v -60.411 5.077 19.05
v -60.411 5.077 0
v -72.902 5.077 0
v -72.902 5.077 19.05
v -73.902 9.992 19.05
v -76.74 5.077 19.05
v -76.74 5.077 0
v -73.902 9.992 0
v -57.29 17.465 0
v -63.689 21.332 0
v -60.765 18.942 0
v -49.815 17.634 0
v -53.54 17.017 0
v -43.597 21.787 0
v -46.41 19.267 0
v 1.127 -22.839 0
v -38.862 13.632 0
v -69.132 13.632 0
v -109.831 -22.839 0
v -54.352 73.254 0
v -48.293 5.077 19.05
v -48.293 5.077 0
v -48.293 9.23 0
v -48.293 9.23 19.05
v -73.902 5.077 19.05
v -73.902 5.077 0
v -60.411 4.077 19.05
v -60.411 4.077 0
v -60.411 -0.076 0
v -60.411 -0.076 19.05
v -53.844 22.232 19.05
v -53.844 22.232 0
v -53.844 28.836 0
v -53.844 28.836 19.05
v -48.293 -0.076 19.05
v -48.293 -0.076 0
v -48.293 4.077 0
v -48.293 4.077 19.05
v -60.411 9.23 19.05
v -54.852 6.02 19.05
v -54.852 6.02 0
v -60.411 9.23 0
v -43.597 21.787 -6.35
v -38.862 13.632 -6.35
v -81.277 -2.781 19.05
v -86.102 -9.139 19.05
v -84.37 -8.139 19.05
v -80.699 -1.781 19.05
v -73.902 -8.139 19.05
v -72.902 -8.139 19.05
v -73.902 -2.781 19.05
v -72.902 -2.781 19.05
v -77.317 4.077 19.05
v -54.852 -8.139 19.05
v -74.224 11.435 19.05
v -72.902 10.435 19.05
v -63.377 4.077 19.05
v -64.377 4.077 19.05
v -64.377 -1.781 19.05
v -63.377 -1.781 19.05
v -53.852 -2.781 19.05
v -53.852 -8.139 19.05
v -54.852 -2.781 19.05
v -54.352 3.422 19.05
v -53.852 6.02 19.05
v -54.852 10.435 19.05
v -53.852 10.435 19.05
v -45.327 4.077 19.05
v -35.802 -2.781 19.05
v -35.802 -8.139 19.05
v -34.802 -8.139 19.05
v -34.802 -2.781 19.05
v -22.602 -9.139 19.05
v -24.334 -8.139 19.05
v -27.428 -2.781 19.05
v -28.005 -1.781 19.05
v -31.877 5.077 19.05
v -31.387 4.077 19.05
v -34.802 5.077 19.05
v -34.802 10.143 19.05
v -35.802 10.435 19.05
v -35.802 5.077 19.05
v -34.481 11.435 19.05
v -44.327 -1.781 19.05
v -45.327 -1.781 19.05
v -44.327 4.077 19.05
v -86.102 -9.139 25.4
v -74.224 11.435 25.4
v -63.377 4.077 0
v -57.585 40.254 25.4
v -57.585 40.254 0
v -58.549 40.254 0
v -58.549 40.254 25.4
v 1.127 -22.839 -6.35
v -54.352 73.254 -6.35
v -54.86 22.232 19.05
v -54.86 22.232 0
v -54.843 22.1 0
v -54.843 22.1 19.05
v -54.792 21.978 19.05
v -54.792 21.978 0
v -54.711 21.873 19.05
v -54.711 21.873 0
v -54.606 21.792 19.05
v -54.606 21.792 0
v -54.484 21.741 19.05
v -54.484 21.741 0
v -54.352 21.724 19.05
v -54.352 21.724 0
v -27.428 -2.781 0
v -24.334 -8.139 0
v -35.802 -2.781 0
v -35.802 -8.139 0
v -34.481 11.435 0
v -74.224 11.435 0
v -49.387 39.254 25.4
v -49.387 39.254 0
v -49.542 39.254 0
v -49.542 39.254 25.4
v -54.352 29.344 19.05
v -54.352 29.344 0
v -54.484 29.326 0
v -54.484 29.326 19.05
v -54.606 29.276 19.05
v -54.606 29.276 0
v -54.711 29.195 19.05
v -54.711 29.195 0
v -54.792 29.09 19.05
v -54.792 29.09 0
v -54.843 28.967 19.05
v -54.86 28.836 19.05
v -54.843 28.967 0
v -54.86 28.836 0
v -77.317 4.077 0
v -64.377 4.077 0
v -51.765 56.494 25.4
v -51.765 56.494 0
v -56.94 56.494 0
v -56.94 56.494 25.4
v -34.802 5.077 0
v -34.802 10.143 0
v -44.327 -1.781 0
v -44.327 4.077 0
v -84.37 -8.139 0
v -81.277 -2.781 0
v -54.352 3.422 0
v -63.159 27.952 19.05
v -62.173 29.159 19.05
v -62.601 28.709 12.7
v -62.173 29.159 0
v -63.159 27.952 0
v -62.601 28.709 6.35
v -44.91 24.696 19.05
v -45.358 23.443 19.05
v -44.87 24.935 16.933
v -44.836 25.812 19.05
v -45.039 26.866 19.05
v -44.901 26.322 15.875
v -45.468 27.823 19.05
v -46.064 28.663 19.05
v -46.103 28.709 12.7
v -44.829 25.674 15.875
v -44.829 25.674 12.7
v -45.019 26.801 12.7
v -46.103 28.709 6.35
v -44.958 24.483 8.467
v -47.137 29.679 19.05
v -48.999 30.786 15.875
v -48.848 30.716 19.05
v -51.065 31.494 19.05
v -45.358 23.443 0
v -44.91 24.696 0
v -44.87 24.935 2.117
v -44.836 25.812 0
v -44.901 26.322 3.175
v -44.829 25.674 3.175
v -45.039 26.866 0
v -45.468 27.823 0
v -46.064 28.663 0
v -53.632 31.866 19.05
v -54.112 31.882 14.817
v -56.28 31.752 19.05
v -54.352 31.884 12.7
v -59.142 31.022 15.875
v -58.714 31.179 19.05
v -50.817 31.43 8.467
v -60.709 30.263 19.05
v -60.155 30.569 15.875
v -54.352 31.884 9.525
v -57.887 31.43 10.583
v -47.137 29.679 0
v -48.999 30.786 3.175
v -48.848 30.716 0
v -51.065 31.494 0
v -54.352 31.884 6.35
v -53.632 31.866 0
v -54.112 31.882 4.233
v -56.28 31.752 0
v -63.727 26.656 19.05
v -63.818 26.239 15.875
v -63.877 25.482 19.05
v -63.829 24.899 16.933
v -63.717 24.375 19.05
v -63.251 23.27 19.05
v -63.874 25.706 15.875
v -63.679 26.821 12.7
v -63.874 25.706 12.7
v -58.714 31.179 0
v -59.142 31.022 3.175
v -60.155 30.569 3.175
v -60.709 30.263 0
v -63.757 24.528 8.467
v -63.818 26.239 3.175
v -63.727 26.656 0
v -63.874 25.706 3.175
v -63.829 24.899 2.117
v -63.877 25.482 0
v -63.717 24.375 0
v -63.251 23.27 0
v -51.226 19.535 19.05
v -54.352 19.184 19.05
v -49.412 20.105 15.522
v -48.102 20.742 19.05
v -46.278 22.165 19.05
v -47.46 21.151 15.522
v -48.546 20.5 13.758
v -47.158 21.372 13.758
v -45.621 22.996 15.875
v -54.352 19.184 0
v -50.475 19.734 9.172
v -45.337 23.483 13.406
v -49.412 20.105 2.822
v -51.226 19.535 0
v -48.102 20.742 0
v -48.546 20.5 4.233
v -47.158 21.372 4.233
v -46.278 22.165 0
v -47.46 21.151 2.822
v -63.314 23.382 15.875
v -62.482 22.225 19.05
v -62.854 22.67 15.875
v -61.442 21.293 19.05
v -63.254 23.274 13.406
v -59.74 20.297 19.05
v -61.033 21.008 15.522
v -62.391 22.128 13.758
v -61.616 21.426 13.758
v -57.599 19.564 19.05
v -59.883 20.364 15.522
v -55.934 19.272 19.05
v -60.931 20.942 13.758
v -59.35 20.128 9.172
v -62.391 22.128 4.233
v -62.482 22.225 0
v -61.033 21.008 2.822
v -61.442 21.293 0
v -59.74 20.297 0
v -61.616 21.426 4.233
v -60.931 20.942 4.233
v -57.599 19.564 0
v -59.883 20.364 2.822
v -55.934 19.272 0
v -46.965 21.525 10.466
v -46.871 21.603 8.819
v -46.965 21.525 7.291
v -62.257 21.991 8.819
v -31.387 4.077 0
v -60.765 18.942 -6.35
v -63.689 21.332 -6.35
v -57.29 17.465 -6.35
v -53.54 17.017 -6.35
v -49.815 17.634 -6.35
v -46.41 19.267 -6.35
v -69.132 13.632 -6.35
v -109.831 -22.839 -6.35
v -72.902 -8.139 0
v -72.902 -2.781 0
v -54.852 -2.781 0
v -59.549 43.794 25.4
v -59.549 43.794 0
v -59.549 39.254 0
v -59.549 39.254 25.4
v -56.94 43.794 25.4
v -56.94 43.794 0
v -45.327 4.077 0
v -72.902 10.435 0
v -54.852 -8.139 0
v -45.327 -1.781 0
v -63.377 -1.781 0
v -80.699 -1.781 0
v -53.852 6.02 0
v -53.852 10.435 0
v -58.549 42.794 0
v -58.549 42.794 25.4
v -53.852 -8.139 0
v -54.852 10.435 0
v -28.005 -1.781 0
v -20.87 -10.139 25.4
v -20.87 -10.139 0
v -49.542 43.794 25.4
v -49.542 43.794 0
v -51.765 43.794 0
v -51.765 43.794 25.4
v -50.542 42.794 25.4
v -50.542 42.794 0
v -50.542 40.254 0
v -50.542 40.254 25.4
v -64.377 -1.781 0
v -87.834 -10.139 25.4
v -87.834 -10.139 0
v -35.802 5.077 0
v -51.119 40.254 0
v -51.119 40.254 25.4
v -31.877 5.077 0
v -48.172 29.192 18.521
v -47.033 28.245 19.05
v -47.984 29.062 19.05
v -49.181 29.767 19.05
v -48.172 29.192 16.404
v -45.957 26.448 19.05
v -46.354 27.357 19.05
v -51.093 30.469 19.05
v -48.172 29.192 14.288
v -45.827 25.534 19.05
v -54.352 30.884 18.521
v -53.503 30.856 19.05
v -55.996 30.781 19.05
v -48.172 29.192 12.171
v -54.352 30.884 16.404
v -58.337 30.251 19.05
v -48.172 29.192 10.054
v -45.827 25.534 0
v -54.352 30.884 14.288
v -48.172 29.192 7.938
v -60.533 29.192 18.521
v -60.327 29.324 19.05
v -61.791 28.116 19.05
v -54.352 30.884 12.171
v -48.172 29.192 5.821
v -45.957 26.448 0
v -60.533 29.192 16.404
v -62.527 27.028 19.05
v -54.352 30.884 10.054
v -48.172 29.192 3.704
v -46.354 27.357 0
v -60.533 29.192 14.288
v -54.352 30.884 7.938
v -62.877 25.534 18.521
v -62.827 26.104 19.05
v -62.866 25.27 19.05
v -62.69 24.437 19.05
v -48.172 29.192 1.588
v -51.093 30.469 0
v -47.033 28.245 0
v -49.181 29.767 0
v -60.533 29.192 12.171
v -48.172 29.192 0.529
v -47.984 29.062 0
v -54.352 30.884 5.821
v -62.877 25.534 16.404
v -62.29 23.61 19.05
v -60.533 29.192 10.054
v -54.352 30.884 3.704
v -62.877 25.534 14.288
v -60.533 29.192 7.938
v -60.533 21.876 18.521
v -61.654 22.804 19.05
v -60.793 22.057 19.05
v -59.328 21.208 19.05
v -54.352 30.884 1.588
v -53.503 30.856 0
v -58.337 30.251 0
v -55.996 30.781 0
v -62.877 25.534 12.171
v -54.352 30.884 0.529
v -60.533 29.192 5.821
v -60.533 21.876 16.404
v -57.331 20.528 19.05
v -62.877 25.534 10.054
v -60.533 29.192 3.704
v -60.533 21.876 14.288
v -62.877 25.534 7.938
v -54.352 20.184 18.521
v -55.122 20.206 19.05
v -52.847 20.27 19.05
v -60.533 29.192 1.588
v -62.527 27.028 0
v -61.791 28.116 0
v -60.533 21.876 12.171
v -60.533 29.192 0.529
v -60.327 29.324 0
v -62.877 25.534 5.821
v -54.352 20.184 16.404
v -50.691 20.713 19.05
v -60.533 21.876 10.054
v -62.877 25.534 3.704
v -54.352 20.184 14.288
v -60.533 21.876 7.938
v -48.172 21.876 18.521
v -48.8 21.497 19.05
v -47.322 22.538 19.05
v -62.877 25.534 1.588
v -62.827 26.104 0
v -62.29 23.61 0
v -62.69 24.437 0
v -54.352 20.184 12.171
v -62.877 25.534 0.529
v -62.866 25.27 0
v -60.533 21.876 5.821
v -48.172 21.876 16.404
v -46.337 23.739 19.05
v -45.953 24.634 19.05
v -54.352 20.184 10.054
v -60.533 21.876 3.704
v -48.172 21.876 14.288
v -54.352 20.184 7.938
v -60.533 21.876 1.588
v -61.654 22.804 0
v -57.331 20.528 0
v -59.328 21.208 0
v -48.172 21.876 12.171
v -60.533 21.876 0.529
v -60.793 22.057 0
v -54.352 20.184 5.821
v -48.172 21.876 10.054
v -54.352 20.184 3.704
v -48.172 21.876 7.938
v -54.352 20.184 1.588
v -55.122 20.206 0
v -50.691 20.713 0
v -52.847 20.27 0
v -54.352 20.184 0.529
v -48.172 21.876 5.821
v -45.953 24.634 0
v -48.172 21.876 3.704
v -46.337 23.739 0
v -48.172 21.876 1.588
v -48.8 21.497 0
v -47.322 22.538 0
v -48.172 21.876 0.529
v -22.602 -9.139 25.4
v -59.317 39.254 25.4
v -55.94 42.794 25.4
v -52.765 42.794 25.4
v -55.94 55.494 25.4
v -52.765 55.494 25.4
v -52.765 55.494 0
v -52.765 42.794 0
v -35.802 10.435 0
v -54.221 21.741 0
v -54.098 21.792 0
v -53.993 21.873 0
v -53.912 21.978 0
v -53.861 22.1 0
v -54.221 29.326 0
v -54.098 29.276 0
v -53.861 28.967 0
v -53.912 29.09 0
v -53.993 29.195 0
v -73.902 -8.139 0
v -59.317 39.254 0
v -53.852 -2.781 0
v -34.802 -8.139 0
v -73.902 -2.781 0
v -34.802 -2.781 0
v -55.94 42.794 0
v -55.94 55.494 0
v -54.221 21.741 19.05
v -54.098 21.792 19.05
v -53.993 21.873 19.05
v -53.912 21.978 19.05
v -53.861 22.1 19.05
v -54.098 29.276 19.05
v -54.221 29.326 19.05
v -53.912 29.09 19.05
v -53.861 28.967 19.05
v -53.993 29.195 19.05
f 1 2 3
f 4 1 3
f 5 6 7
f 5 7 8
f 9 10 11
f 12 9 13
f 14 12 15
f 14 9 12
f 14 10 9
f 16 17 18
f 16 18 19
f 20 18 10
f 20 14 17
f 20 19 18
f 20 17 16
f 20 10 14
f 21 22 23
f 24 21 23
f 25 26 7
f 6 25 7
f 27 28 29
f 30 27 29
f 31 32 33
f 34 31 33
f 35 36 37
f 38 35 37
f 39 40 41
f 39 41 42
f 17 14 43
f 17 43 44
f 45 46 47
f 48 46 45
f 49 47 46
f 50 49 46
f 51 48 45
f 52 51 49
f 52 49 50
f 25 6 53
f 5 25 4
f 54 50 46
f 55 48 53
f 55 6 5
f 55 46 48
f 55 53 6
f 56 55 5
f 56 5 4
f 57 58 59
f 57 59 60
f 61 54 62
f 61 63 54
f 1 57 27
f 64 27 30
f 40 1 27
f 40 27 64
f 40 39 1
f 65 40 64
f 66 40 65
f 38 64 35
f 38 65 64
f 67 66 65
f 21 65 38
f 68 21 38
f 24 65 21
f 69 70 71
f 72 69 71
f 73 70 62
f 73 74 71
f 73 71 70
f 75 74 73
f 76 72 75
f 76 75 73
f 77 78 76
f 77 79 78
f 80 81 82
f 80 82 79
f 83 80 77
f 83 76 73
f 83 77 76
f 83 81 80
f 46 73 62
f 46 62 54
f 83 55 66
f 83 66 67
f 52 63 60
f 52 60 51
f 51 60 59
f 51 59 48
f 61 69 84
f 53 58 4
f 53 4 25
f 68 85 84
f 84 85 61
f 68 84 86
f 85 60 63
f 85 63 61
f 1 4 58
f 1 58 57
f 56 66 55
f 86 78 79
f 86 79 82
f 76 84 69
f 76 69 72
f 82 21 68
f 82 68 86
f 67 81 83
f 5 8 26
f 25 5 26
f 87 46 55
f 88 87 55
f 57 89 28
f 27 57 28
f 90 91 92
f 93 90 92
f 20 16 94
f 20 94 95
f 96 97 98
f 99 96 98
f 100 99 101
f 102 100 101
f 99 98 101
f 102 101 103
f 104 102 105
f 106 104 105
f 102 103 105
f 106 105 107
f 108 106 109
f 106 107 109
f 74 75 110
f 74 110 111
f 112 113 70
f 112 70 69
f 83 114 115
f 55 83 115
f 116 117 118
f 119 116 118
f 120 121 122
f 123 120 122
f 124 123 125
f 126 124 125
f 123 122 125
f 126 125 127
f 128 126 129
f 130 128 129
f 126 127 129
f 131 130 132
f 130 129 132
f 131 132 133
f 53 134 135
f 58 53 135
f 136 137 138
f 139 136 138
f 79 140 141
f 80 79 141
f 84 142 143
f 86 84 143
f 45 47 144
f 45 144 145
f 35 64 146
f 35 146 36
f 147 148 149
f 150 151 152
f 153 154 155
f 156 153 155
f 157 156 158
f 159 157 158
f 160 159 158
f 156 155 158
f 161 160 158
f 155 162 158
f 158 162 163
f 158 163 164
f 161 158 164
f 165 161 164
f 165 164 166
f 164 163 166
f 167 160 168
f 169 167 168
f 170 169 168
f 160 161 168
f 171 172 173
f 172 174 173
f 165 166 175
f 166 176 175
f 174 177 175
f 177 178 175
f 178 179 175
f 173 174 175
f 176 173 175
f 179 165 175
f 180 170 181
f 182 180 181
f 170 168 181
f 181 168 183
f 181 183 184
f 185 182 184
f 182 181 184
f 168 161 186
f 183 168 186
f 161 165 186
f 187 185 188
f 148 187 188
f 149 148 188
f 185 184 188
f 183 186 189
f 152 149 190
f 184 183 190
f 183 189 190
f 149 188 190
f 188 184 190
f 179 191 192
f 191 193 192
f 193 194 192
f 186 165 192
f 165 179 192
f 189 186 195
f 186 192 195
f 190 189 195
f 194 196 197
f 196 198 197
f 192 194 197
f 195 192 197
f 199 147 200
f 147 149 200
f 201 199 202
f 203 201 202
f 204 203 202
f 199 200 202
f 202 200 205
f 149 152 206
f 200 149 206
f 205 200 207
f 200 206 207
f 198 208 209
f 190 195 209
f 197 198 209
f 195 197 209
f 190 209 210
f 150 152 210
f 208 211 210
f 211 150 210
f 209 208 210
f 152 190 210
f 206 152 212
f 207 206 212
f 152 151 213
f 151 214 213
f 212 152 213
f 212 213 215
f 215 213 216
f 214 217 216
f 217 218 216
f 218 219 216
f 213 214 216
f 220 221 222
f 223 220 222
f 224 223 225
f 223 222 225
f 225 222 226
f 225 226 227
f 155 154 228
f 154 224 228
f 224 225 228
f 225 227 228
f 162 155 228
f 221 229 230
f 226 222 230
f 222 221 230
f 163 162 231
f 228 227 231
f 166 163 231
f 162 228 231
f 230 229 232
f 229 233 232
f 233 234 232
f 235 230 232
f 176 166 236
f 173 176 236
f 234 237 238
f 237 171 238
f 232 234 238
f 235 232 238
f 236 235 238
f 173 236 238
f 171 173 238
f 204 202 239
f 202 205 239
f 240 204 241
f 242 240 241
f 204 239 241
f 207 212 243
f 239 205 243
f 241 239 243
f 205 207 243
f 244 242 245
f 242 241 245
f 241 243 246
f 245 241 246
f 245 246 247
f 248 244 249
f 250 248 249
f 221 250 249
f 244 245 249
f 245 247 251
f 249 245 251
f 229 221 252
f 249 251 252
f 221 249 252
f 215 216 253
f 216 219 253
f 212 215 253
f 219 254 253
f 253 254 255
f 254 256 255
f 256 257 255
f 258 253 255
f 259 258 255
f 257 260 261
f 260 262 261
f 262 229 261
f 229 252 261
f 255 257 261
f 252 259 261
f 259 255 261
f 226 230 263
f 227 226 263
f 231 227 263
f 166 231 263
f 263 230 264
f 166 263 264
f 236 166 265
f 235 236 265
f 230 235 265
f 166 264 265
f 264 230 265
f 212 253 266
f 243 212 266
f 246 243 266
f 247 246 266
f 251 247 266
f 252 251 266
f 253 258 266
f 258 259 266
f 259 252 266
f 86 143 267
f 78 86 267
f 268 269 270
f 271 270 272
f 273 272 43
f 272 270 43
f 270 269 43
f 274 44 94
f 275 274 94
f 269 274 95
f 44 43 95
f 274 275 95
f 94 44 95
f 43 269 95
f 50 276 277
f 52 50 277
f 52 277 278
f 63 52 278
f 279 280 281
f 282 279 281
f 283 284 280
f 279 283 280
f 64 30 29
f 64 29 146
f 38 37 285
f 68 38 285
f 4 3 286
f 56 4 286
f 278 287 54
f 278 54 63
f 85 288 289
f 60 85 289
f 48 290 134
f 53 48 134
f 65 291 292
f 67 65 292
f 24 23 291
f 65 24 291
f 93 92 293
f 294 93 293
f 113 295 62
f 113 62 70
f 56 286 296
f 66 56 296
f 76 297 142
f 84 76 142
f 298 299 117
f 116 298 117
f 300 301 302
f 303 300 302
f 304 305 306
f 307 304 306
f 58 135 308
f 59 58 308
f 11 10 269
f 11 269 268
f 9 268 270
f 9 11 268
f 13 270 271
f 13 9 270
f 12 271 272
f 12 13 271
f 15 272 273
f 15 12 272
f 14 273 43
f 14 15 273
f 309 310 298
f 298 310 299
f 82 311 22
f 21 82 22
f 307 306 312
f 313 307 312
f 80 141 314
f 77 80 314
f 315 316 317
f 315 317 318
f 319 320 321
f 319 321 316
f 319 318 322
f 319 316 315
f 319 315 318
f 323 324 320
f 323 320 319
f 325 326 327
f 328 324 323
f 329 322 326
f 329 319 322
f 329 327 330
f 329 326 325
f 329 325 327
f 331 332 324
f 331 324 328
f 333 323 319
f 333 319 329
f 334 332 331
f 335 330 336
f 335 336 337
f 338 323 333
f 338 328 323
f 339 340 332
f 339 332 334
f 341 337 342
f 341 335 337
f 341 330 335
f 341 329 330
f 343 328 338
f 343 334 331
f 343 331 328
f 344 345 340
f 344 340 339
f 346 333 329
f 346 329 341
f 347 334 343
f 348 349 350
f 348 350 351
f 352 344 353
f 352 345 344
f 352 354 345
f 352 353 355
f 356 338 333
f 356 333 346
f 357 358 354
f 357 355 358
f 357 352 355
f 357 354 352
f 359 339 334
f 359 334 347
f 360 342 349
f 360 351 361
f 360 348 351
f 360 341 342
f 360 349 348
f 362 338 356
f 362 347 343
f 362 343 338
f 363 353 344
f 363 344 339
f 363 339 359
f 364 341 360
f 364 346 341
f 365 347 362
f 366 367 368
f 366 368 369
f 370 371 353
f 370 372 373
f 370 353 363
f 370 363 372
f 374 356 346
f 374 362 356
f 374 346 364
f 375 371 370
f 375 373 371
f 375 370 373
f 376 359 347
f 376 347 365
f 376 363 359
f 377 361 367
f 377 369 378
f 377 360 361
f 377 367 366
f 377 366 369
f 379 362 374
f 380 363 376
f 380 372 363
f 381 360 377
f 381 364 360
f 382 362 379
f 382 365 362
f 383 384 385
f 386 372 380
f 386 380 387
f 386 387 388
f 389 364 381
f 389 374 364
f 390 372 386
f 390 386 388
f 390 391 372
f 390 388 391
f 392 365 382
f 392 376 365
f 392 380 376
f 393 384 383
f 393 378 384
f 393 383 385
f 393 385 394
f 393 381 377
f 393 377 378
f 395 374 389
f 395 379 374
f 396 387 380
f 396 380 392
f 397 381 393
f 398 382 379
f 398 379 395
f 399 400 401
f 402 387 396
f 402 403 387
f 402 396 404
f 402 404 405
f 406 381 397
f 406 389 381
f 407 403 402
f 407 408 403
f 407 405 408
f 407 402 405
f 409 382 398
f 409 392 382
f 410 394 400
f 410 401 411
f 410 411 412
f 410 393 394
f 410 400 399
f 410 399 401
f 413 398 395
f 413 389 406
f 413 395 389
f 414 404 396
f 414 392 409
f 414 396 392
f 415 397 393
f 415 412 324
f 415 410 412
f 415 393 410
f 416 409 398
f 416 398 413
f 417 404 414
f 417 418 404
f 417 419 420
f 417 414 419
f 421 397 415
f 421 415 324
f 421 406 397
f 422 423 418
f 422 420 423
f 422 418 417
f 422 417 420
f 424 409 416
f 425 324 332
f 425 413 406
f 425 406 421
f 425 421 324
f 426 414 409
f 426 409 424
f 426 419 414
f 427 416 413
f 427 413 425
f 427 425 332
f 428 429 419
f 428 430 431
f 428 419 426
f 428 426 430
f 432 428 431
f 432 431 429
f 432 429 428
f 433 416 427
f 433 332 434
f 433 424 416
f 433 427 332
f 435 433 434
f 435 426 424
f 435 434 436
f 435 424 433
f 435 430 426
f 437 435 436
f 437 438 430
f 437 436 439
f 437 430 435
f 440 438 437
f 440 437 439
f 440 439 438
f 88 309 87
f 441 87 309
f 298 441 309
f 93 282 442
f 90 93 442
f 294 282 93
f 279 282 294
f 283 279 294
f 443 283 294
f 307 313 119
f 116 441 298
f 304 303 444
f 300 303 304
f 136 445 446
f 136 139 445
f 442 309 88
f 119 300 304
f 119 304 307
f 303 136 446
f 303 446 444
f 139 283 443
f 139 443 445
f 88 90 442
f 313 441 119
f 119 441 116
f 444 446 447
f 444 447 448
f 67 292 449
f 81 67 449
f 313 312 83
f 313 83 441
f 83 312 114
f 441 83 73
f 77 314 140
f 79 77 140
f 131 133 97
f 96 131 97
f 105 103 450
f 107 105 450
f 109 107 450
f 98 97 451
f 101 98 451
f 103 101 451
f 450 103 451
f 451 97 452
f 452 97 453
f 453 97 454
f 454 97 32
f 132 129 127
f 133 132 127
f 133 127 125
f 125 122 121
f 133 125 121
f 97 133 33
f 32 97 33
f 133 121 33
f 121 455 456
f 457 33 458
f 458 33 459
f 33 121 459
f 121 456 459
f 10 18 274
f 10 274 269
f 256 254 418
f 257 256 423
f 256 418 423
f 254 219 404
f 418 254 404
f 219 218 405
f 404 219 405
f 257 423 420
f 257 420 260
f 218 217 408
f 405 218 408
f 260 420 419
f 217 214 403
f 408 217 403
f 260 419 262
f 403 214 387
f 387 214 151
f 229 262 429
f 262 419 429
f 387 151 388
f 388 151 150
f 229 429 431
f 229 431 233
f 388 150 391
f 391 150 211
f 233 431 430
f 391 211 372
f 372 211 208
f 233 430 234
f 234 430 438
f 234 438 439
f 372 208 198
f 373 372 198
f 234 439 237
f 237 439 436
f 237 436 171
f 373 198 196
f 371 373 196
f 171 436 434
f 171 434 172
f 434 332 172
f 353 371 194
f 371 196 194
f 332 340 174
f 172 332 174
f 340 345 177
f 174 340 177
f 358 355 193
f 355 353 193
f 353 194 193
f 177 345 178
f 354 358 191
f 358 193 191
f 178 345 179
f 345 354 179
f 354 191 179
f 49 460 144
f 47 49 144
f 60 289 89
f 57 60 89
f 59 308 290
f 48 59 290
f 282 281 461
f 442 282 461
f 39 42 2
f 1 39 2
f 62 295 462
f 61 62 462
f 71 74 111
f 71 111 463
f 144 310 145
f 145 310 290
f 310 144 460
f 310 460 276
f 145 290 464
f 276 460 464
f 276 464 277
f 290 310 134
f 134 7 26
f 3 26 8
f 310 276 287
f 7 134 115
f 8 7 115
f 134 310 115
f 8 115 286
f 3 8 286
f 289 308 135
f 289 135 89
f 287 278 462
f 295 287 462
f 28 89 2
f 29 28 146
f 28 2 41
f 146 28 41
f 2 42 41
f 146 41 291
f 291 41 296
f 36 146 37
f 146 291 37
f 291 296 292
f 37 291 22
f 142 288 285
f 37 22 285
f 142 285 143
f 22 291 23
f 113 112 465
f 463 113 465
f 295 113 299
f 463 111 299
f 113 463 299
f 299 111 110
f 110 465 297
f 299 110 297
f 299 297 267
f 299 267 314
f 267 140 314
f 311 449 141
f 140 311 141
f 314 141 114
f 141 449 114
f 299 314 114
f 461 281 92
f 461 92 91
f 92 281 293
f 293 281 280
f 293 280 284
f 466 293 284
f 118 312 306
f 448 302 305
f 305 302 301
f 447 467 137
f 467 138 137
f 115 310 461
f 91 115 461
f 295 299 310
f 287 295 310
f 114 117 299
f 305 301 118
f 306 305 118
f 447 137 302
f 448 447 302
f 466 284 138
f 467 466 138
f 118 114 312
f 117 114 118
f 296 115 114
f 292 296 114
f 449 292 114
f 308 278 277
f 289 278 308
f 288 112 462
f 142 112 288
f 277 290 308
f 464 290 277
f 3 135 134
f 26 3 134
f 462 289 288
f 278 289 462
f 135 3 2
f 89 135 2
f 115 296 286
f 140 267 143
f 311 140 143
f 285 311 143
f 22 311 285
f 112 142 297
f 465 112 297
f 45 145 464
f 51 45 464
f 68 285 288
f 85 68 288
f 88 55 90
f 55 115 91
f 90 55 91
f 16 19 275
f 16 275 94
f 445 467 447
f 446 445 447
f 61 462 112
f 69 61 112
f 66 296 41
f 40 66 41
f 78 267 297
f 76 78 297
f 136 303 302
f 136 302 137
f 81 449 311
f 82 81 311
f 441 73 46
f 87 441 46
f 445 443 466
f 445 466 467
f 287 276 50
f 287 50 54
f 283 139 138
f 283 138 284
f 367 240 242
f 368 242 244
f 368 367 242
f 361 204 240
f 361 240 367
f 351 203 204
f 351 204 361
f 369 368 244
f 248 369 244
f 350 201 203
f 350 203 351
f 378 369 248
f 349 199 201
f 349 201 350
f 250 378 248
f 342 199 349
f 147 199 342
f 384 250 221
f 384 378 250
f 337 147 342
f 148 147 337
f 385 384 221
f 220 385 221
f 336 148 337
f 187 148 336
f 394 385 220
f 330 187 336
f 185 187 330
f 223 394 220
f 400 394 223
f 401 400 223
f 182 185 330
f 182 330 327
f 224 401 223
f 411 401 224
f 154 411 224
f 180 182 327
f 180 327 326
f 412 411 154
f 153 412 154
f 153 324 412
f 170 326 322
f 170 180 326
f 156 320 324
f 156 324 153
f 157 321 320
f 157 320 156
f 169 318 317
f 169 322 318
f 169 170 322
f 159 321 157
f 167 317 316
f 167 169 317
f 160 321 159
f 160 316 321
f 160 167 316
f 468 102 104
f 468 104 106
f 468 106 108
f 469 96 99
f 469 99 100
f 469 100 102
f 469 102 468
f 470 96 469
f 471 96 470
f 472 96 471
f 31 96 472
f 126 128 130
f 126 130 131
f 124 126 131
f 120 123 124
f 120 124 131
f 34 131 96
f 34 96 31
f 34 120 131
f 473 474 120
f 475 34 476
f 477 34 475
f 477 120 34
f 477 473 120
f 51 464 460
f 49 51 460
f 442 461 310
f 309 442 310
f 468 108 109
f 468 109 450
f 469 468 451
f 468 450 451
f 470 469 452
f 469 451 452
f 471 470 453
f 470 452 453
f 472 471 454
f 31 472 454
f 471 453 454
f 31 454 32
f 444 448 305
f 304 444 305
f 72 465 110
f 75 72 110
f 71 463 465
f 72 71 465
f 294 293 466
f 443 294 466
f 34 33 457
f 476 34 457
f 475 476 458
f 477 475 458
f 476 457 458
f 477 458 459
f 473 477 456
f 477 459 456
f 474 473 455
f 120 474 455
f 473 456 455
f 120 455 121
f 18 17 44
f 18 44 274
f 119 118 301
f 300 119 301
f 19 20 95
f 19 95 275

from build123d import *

# Parameters (mm, degrees)
F0_W     = 18.05
F0_H     = 5.358
F1_DEPTH = 19.05
F2_DEPTH = 25.4
F4_DEPTH = 6.35


# Not quite as in the source:
# - the dataset's text gives a spline's control points without its knots; the knots are read off the source's solid


with BuildPart() as f1:
    # F0 (on Top) → F1 (new body)
    with BuildSketch(Plane.XY):
        Polygon((-73.402151112, 4.5771139196), (-78.1832148198, 4.5771139196), (-82.1426829659, -2.2808860804), (-73.402151112, -2.2808860804), (-63.877151112, -2.2808860804), (-63.877151112, 4.5771139196), align=None)
        Polygon((-64.377151112, -1.7808860804), (-80.6993072929, -1.7808860804), (-77.317189416, 4.0771139196), (-64.377151112, 4.0771139196), align=None, mode=Mode.SUBTRACT)
        Polygon((-73.402151112, -2.2808860804), (-82.1426829659, -2.2808860804), (-86.102151112, -9.1388860804), (-73.402151112, -9.1388860804), align=None)
        Polygon((-84.3701003044, -8.1388860804), (-81.2766575621, -2.7808860804), (-73.902151112, -2.7808860804), (-73.902151112, -8.1388860804), align=None, mode=Mode.SUBTRACT)
        Polygon((-63.877151112, -2.2808860804), (-73.402151112, -2.2808860804), (-73.402151112, -9.1388860804), (-54.352151112, -9.1388860804), (-54.352151112, -2.2808860804), align=None)
        with Locations((-63.877151112, -5.4598860804)):
            Rectangle(F0_W, F0_H, mode=Mode.SUBTRACT)
        Polygon((-35.302151112, 11.4351139196), (-73.402151112, 11.4351139196), (-73.402151112, 4.5771139196), (-63.877151112, 4.5771139196), (-63.877151112, -2.2808860804), (-54.352151112, -2.2808860804), (-44.827151112, -2.2808860804), (-44.827151112, 4.5771139196), (-35.302151112, 4.5771139196), align=None)
        Polygon((-48.2928307031, -0.0759368879), (-48.2928307031, 4.0771139196), (-45.327151112, 4.0771139196), (-45.327151112, -1.7808860804), (-63.377151112, -1.7808860804), (-63.377151112, 4.0771139196), (-60.4114715209, 4.0771139196), (-60.4114715209, -0.0759368879), (-54.352151112, 3.4224133812), align=None, mode=Mode.SUBTRACT)
        Polygon((-60.4114715209, 9.2301647272), (-60.4114715209, 5.0771139196), (-72.902151112, 5.0771139196), (-72.902151112, 10.4351139196), (-54.852151112, 10.4351139196), (-54.852151112, 6.0204895926), align=None, mode=Mode.SUBTRACT)
        Polygon((-35.802151112, 5.0771139196), (-48.2928307031, 5.0771139196), (-48.2928307031, 9.2301647272), (-53.852151112, 6.0204895926), (-53.852151112, 10.4351139196), (-35.802151112, 10.4351139196), align=None, mode=Mode.SUBTRACT)
        Polygon((-73.402151112, 11.4351139196), (-74.2237466737, 11.4351139196), (-78.1832148198, 4.5771139196), (-73.402151112, 4.5771139196), align=None)
        Polygon((-73.902151112, 5.0771139196), (-76.7398391468, 5.0771139196), (-73.902151112, 9.992133772), align=None, mode=Mode.SUBTRACT)
        Polygon((-34.4805555503, 11.4351139196), (-35.302151112, 11.4351139196), (-35.302151112, 4.5771139196), (-30.5210874042, 4.5771139196), align=None)
        Polygon((-34.802151112, 10.1431388709), (-31.8772802426, 5.0771139196), (-34.802151112, 5.0771139196), align=None, mode=Mode.SUBTRACT)
        Polygon((-30.5210874042, 4.5771139196), (-35.302151112, 4.5771139196), (-44.827151112, 4.5771139196), (-44.827151112, -2.2808860804), (-35.302151112, -2.2808860804), (-26.5616192581, -2.2808860804), align=None)
        Polygon((-31.387112808, 4.0771139196), (-28.0049949311, -1.7808860804), (-44.327151112, -1.7808860804), (-44.327151112, 4.0771139196), align=None, mode=Mode.SUBTRACT)
        Polygon((-22.602151112, -9.1388860804), (-26.5616192581, -2.2808860804), (-35.302151112, -2.2808860804), (-35.302151112, -9.1388860804), align=None)
        Polygon((-34.802151112, -2.7808860804), (-27.4276446619, -2.7808860804), (-24.3342019195, -8.1388860804), (-34.802151112, -8.1388860804), align=None, mode=Mode.SUBTRACT)
        Polygon((-54.352151112, -2.2808860804), (-54.352151112, -9.1388860804), (-35.302151112, -9.1388860804), (-35.302151112, -2.2808860804), (-44.827151112, -2.2808860804), align=None)
        with Locations((-44.827151112, -5.4598860804)):
            Rectangle(F0_W, F0_H, mode=Mode.SUBTRACT)
    extrude(amount=F1_DEPTH)

    # F0 (on Top) → F2 (join)
    with BuildSketch(Plane.XY):
        Polygon((-56.939651112, 43.7939179328), (-59.5488287793, 43.7939179328), (-59.5488287793, 39.2539179328), (-59.3172532265, 39.2539179328), (-87.8342019195, -10.1388860804), (-20.8701003044, -10.1388860804), (-49.3870489975, 39.2539179328), (-49.542151112, 39.2539179328), (-49.542151112, 43.7939179328), (-51.764651112, 43.7939179328), (-51.764651112, 56.4939179328), (-56.939651112, 56.4939179328), align=None)
        Polygon((-74.2237466737, 11.4351139196), (-57.5852024189, 40.2539179328), (-58.5488287793, 40.2539179328), (-58.5488287793, 42.7939179328), (-55.939651112, 42.7939179328), (-55.939651112, 55.4939179328), (-52.764651112, 55.4939179328), (-52.764651112, 42.7939179328), (-50.542151112, 42.7939179328), (-50.542151112, 40.2539179328), (-51.119099805, 40.2539179328), (-34.4805555503, 11.4351139196), (-30.5210874042, 4.5771139196), (-26.5616192581, -2.2808860804), (-22.602151112, -9.1388860804), (-35.302151112, -9.1388860804), (-54.352151112, -9.1388860804), (-73.402151112, -9.1388860804), (-86.102151112, -9.1388860804), (-82.1426829659, -2.2808860804), (-78.1832148198, 4.5771139196), align=None, mode=Mode.SUBTRACT)
    extrude(amount=F2_DEPTH)


with BuildPart() as f1b:
    # F0 (on Top) → F1, piece 2 (new body)
    with BuildSketch(Plane.XY):
        with BuildLine():
            add(Edge.make_bspline(
                [(-54.352145642, 19.1837270599), (-37.8543616999, 19.1837270599), (-46.103253671, 28.7087270599), (-54.352145642, 38.2337270599), (-62.6010376131, 28.7087270599), (-70.8499295841, 19.1837270599), (-54.352145642, 19.1837270599)],
                knots=[4.7123889804, 4.7123889804, 4.7123889804, 6.8067840828, 6.8067840828, 8.9011791852, 8.9011791852, 10.9955742876, 10.9955742876, 10.9955742876], degree=2, weights=[1, 0.5, 1, 0.5, 1, 0.5, 1]))
        make_face()
        with BuildLine():
            add(Edge.make_bspline(
                [(-45.827145642, 25.5337270599), (-45.827145642, 25.8519377152), (-45.9208714076, 26.4883590256), (-46.3482817791, 27.4376066909), (-47.0906705746, 28.3694216685), (-48.1278583866, 29.2134440557), (-49.4278608435, 29.9276027455), (-50.9536840842, 30.4720106822), (-52.334286038, 30.7509003907), (-53.4791973585, 30.8645462988), (-54.352145642, 30.8933174405), (-55.2250939256, 30.8645462988), (-56.3700052461, 30.7509003907), (-57.7506071999, 30.4720106822), (-59.2764304406, 29.9276027455), (-60.5764328975, 29.2134440557), (-61.6136207095, 28.3694216685), (-62.3560095049, 27.4376066909), (-62.7834198764, 26.4883590256), (-62.9240085248, 25.5337270599), (-62.7834198764, 24.5790950943), (-62.3560095049, 23.6298474289), (-61.6136207095, 22.6980324514), (-60.5764328975, 21.8540100641), (-59.2764304406, 21.1398513743), (-57.7506071999, 20.5954434377), (-56.3700052461, 20.3165537291), (-55.2250939256, 20.2029078211), (-54.352145642, 20.1741366794), (-53.4791973585, 20.2029078211), (-52.334286038, 20.3165537291), (-50.9536840842, 20.5954434377), (-49.4278608435, 21.1398513743), (-48.1278583866, 21.8540100641), (-47.0906705746, 22.6980324514), (-46.3482817791, 23.6298474289), (-45.9208714076, 24.5790950943), (-45.827145642, 25.2155164047), (-45.827145642, 25.5337270599)],
                knots=[0, 0, 0, 0, 0.03125, 0.0625, 0.09375, 0.125, 0.15625, 0.1875, 0.21875, 0.234375, 0.25, 0.265625, 0.28125, 0.3125, 0.34375, 0.375, 0.40625, 0.4375, 0.46875, 0.5, 0.53125, 0.5625, 0.59375, 0.625, 0.65625, 0.6875, 0.71875, 0.734375, 0.75, 0.765625, 0.78125, 0.8125, 0.84375, 0.875, 0.90625, 0.9375, 0.96875, 1, 1, 1, 1], degree=3))
        make_face(mode=Mode.SUBTRACT)
    extrude(amount=F1_DEPTH)


with BuildPart() as f1c:
    # F0 (on Top) → F1, piece 3 (new body)
    with BuildSketch(Plane.XY):
        with BuildLine():
            ThreePointArc((-54.352145642, 29.3437270599), (-54.7113558869, 29.1949373048), (-54.860145642, 28.8357270599))
            Line((-54.860145642, 28.8357270599), (-54.860145642, 22.2317270599))
            ThreePointArc((-54.860145642, 22.2317270599), (-54.7113558869, 21.8725168151), (-54.352145642, 21.7237270599))
            ThreePointArc((-54.352145642, 21.7237270599), (-53.9929353972, 21.8725168151), (-53.844145642, 22.2317270599))
            Line((-53.844145642, 22.2317270599), (-53.844145642, 28.8357270599))
            ThreePointArc((-53.844145642, 28.8357270599), (-53.9929353972, 29.1949373048), (-54.352145642, 29.3437270599))
        make_face()
    extrude(amount=F1_DEPTH)


with BuildPart() as f4:
    # F3 (on face) → F4 (new body)
    with BuildSketch(Plane.XY):
        Polygon((-109.8312471757, -22.8388860804), (1.1269449517, -22.8388860804), (-54.352151112, 73.2537270599), align=None)
        Polygon((-59.5488287793, 43.7939179328), (-56.939651112, 43.7939179328), (-56.939651112, 56.4939179328), (-51.764651112, 56.4939179328), (-51.764651112, 43.7939179328), (-49.542151112, 43.7939179328), (-49.542151112, 39.2539179328), (-49.3870489975, 39.2539179328), (-20.8701003044, -10.1388860804), (-87.8342019195, -10.1388860804), (-59.3172532265, 39.2539179328), (-59.5488287793, 39.2539179328), align=None, mode=Mode.SUBTRACT)
        Polygon((-56.939651112, 56.4939179328), (-56.939651112, 43.7939179328), (-59.5488287793, 43.7939179328), (-59.5488287793, 39.2539179328), (-59.3172532265, 39.2539179328), (-87.8342019195, -10.1388860804), (-20.8701003044, -10.1388860804), (-49.3870489975, 39.2539179328), (-49.542151112, 39.2539179328), (-49.542151112, 43.7939179328), (-51.764651112, 43.7939179328), (-51.764651112, 56.4939179328), align=None)
        Polygon((-78.1832148198, 4.5771139196), (-74.2237466737, 11.4351139196), (-57.5852024189, 40.2539179328), (-58.5488287793, 40.2539179328), (-58.5488287793, 42.7939179328), (-55.939651112, 42.7939179328), (-55.939651112, 55.4939179328), (-52.764651112, 55.4939179328), (-52.764651112, 42.7939179328), (-50.542151112, 42.7939179328), (-50.542151112, 40.2539179328), (-51.119099805, 40.2539179328), (-34.4805555503, 11.4351139196), (-30.5210874042, 4.5771139196), (-26.5616192581, -2.2808860804), (-22.602151112, -9.1388860804), (-35.302151112, -9.1388860804), (-54.352151112, -9.1388860804), (-73.402151112, -9.1388860804), (-86.102151112, -9.1388860804), (-82.1426829659, -2.2808860804), align=None, mode=Mode.SUBTRACT)
        Polygon((-57.5852024189, 40.2539179328), (-74.2237466737, 11.4351139196), (-78.1832148198, 4.5771139196), (-82.1426829659, -2.2808860804), (-86.102151112, -9.1388860804), (-73.402151112, -9.1388860804), (-54.352151112, -9.1388860804), (-35.302151112, -9.1388860804), (-22.602151112, -9.1388860804), (-26.5616192581, -2.2808860804), (-30.5210874042, 4.5771139196), (-34.4805555503, 11.4351139196), (-51.119099805, 40.2539179328), (-50.542151112, 40.2539179328), (-50.542151112, 42.7939179328), (-52.764651112, 42.7939179328), (-52.764651112, 55.4939179328), (-55.939651112, 55.4939179328), (-55.939651112, 42.7939179328), (-58.5488287793, 42.7939179328), (-58.5488287793, 40.2539179328), align=None)
        with BuildLine():
            ThreePointArc((-63.6885240674, 21.3321540505), (-53.5401728786, 17.0166304748), (-43.5974113792, 21.7867740102))
            Line((-43.5974113792, 21.7867740102), (-38.8624295592, 13.6320823804))
            Line((-38.8624295592, 13.6320823804), (-69.1316798329, 13.6320823804))
            Line((-69.1316798329, 13.6320823804), (-63.6885240674, 21.3321540505))
        make_face(mode=Mode.SUBTRACT)
    extrude(amount=-F4_DEPTH)


solid = Compound([f1.part, f1b.part, f1c.part, f4.part])
